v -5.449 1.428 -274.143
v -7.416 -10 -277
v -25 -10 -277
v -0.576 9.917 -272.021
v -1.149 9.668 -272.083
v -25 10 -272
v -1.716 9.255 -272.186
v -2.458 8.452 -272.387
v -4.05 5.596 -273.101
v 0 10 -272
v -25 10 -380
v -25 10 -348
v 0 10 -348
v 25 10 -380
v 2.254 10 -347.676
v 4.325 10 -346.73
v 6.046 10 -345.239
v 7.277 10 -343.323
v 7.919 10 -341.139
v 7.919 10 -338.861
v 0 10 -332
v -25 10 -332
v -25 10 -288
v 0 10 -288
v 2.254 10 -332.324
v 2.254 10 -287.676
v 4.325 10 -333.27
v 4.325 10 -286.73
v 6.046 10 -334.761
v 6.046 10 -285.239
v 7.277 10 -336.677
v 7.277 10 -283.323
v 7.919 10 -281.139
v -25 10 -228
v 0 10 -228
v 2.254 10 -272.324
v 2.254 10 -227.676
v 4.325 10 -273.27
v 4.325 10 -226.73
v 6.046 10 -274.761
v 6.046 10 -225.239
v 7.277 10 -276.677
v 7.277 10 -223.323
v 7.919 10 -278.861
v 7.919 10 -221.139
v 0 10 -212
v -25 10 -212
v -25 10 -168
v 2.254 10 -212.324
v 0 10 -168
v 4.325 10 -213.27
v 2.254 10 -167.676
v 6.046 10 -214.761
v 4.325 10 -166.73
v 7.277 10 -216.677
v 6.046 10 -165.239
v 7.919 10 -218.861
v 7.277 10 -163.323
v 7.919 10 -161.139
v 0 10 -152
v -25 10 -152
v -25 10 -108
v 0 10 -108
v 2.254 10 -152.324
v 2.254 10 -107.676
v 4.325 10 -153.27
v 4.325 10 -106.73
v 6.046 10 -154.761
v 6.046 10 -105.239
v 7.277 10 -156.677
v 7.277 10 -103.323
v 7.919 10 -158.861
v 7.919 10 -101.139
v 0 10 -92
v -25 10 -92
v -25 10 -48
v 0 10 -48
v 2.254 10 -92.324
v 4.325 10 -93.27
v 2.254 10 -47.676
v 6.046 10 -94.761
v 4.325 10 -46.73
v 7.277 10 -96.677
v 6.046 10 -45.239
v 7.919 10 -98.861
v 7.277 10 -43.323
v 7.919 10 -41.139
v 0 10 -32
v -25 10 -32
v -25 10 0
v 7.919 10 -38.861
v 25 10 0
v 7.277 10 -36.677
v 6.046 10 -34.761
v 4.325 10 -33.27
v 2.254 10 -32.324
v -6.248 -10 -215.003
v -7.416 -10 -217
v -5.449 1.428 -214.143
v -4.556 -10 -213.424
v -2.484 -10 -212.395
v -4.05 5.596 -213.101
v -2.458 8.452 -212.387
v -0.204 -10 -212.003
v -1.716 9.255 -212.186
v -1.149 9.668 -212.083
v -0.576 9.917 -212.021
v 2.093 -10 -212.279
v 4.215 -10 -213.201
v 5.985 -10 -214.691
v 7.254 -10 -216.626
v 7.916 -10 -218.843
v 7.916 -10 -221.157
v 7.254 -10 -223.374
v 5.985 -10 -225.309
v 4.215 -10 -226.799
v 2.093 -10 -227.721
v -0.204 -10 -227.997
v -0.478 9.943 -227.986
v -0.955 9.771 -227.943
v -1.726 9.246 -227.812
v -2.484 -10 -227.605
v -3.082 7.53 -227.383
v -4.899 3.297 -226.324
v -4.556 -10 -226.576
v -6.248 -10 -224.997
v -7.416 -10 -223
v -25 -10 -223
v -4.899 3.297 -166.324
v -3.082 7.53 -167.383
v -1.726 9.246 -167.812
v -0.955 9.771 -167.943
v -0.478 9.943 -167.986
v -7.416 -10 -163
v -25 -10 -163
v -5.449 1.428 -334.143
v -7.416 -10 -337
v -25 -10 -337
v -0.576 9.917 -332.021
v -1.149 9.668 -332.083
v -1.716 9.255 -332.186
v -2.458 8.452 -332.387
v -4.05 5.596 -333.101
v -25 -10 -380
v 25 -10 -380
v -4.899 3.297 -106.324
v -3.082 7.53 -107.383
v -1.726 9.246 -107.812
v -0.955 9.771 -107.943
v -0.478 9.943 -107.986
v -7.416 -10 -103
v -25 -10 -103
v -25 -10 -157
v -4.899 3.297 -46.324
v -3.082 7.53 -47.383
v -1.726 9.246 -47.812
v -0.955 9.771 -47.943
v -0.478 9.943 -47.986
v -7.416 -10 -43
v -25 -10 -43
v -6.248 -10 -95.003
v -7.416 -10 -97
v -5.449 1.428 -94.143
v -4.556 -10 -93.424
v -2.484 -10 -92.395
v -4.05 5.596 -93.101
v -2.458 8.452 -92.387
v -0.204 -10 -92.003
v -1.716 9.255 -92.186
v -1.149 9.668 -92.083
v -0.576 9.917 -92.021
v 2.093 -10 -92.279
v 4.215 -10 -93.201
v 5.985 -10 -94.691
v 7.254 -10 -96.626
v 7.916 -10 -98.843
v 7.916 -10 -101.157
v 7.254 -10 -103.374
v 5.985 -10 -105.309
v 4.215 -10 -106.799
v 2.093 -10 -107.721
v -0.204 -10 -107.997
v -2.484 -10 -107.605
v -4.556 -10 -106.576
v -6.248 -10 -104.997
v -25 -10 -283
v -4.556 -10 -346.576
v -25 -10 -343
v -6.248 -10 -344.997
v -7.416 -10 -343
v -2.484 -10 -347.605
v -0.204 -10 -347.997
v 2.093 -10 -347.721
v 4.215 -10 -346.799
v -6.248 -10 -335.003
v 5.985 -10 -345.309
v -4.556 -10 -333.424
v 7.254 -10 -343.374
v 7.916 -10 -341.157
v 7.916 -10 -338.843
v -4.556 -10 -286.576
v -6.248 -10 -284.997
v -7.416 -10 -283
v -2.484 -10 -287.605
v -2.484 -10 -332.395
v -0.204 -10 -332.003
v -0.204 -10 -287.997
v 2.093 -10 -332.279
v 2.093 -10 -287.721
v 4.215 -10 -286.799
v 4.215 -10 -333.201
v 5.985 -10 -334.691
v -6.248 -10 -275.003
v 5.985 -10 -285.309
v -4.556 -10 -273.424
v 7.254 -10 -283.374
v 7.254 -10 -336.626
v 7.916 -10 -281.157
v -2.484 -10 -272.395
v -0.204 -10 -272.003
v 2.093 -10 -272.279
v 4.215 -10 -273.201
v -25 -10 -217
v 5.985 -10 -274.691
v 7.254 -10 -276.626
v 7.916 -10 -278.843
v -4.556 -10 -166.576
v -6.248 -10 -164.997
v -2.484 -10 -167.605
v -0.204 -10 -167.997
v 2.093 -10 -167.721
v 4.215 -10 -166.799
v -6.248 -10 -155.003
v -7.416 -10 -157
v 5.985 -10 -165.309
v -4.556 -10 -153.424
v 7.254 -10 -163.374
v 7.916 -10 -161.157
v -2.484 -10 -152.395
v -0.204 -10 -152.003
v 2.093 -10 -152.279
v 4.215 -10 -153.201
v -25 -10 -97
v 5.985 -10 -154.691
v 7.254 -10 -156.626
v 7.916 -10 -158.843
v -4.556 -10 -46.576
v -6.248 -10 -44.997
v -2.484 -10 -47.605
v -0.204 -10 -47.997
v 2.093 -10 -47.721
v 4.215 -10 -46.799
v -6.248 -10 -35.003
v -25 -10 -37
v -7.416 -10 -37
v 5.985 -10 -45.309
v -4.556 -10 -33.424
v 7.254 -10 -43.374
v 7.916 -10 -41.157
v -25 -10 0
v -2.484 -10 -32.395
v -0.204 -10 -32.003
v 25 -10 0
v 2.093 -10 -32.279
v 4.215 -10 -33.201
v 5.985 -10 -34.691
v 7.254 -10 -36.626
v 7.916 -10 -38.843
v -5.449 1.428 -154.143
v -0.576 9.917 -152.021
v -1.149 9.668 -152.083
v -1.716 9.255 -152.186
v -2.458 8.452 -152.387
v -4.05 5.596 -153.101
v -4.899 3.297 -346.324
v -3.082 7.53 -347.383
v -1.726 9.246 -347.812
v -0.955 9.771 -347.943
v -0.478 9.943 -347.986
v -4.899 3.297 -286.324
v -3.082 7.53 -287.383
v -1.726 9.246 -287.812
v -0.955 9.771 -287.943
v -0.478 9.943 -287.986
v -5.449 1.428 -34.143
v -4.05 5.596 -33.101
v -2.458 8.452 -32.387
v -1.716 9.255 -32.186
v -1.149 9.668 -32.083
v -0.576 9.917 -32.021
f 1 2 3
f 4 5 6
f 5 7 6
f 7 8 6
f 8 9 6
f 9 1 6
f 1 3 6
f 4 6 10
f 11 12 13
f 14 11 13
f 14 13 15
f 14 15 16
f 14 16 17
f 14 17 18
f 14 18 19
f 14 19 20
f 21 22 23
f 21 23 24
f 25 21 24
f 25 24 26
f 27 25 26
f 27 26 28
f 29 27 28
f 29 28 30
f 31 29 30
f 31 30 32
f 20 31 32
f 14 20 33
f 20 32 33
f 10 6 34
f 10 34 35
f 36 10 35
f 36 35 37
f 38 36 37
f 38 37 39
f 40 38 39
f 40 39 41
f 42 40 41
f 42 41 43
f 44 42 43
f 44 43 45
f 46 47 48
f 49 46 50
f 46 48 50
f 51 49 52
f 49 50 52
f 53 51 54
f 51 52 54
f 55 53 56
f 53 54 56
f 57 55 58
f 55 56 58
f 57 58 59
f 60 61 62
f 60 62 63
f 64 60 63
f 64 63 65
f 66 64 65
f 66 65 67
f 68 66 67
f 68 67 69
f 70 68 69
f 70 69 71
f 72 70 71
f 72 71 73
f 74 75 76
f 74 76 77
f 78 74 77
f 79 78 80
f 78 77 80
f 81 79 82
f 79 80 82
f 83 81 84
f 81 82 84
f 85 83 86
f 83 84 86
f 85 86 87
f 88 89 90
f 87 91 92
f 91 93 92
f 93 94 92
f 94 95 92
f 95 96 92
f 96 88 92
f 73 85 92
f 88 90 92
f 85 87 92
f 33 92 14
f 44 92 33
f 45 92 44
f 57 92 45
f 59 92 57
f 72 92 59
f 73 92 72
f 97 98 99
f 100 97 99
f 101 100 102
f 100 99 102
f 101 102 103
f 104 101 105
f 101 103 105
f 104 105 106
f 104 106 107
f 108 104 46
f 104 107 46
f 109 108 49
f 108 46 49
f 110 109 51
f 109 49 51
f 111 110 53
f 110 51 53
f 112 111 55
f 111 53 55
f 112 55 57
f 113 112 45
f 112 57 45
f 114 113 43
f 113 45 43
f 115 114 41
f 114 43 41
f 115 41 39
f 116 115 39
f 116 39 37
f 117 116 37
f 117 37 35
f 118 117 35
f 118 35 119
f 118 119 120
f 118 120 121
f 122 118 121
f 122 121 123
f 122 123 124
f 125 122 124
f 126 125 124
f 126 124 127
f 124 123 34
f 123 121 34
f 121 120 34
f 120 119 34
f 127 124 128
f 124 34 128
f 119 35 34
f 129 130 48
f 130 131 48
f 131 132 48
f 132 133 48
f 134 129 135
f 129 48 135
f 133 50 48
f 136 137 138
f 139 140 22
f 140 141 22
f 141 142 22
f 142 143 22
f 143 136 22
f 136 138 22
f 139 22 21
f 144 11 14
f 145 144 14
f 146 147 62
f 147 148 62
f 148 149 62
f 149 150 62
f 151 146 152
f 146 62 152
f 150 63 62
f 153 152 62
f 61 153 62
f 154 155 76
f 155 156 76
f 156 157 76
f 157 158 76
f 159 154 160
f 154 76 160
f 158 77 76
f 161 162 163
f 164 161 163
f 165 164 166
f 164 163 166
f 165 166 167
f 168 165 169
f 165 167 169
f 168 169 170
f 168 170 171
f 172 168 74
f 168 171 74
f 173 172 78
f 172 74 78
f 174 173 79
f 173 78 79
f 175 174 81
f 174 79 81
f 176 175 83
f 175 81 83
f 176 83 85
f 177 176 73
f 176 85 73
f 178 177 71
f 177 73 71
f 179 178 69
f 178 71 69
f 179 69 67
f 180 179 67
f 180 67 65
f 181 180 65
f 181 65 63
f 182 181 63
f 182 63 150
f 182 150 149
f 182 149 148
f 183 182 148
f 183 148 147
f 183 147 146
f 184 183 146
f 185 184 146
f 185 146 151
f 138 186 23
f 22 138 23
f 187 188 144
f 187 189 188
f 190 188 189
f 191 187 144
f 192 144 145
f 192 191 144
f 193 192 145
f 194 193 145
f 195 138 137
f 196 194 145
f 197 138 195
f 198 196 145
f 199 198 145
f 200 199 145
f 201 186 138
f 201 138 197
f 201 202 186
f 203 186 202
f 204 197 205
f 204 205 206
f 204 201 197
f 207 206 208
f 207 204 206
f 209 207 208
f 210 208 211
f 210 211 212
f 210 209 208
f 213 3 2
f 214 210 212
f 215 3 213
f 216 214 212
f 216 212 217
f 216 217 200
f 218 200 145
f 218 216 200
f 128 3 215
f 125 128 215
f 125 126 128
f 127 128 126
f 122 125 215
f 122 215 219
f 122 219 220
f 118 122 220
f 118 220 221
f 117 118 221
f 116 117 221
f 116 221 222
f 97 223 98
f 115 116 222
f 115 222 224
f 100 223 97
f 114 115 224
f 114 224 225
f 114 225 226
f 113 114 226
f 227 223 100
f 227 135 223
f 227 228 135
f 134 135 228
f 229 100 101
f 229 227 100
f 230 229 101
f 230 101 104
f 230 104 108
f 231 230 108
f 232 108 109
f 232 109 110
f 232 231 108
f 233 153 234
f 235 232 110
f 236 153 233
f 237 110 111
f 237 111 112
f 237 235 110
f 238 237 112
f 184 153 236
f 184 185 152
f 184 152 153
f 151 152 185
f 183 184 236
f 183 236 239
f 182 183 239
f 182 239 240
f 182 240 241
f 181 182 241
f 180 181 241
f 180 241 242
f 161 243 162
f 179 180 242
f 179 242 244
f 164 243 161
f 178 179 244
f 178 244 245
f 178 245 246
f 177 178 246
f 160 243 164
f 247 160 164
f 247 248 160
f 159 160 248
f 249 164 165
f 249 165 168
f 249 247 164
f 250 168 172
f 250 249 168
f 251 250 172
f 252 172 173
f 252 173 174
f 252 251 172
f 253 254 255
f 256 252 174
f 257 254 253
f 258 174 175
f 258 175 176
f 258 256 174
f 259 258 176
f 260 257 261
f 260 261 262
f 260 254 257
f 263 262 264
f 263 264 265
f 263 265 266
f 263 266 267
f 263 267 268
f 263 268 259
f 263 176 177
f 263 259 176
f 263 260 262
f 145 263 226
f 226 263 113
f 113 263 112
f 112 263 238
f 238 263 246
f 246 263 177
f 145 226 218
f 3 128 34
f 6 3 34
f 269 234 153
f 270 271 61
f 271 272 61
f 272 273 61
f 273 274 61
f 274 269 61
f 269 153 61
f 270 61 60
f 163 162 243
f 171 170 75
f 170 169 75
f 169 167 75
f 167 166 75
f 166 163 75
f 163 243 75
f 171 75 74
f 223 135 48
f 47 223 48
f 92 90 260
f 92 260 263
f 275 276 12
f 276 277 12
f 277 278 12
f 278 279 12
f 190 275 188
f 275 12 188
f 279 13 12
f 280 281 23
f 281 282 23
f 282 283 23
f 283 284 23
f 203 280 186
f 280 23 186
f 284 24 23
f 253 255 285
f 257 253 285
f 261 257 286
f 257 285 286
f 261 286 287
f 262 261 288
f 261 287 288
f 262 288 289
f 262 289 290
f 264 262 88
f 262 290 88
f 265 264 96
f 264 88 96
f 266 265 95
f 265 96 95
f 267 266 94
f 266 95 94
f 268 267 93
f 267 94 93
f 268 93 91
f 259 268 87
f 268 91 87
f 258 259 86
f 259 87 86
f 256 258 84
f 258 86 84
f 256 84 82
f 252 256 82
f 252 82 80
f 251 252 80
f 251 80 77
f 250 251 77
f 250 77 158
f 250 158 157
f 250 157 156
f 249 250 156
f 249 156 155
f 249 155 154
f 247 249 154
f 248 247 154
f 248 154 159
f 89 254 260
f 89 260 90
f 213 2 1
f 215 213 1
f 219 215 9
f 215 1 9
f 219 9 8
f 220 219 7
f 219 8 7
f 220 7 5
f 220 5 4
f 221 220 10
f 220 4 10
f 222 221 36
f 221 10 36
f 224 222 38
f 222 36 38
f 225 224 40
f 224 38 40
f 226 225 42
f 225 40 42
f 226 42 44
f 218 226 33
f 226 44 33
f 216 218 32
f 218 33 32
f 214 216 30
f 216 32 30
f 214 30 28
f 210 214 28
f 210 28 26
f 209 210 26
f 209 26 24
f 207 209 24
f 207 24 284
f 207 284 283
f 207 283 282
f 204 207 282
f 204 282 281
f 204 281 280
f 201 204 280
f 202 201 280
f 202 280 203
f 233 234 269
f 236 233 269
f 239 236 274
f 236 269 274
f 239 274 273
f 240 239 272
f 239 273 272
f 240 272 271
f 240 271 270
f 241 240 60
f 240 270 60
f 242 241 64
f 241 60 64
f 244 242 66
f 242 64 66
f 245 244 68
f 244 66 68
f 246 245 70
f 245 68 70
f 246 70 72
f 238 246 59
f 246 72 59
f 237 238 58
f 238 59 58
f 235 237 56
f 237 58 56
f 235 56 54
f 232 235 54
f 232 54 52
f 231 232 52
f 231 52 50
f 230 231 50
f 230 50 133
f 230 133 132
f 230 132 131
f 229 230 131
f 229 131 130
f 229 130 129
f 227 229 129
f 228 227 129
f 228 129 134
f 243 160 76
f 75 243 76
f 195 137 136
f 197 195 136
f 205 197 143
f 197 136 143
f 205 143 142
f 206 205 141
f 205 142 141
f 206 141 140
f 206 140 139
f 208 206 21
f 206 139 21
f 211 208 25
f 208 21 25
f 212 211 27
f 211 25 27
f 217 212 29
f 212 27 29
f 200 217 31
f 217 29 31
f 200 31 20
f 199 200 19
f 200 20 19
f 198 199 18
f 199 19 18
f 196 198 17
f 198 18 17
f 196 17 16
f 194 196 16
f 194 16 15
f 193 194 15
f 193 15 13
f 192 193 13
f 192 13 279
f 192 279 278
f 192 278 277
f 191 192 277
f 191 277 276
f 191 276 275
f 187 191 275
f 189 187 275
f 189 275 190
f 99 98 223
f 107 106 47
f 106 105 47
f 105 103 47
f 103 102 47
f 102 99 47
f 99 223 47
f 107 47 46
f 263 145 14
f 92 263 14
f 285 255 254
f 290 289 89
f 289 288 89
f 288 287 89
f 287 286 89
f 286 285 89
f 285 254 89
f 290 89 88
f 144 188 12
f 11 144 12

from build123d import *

# Parameters (mm, degrees)
SKETCH1_W           = 50
SKETCH1_H           = 20
BOSS_EXTRUDE1_DEPTH = 380
SKETCH2_R           = 8
CUT_EXTRUDE1_DEPTH  = 21
CUT_EXTRUDE2_REACH  = 52


with BuildPart() as part:
    # Sketch1 → Boss-Extrude1 (new body)
    with BuildSketch(Plane.XY):
        Rectangle(SKETCH1_W, SKETCH1_H)
    extrude(amount=-BOSS_EXTRUDE1_DEPTH)

    # Sketch2 → Cut-Extrude1 (cut, through all)
    with BuildSketch(Plane(origin=(0, 10, 0), x_dir=(1, 0, 0), z_dir=(0, 1, 0))):
        with Locations((0, 40)):
            Circle(SKETCH2_R)
        with Locations((0, 100)):
            Circle(SKETCH2_R)
        with Locations((0, 160)):
            Circle(SKETCH2_R)
        with Locations((0, 220)):
            Circle(SKETCH2_R)
        with Locations((0, 280)):
            Circle(SKETCH2_R)
        with Locations((0, 340)):
            Circle(SKETCH2_R)
    extrude(amount=-CUT_EXTRUDE1_DEPTH, mode=Mode.SUBTRACT)

    # Sketch3 → Cut-Extrude2 (cut, up to next)
    with BuildSketch(Plane.ZY.offset(25), mode=Mode.PRIVATE) as cut_extrude2_sk1:
        Polygon((-348, 10), (-343, -10), (-337, -10), (-332, 10), align=None)
    cut_extrude2_tool1 = extrude(cut_extrude2_sk1.sketch, amount=-CUT_EXTRUDE2_REACH, mode=Mode.PRIVATE) & part.part
    add(cut_extrude2_tool1.solids().sort_by_distance((-25, 1.515152, -340))[0], mode=Mode.SUBTRACT)
    # Sketch3 → Cut-Extrude2 (cut, up to next)
    with BuildSketch(Plane.ZY.offset(25), mode=Mode.PRIVATE) as cut_extrude2_sk2:
        Polygon((-288, 10), (-283, -10), (-277, -10), (-272, 10), align=None)
    cut_extrude2_tool2 = extrude(cut_extrude2_sk2.sketch, amount=-CUT_EXTRUDE2_REACH, mode=Mode.PRIVATE) & part.part
    add(cut_extrude2_tool2.solids().sort_by_distance((-25, 1.515152, -280))[0], mode=Mode.SUBTRACT)
    # Sketch3 → Cut-Extrude2 (cut, up to next)
    with BuildSketch(Plane.ZY.offset(25), mode=Mode.PRIVATE) as cut_extrude2_sk3:
        Polygon((-228, 10), (-223, -10), (-217, -10), (-212, 10), align=None)
    cut_extrude2_tool3 = extrude(cut_extrude2_sk3.sketch, amount=-CUT_EXTRUDE2_REACH, mode=Mode.PRIVATE) & part.part
    add(cut_extrude2_tool3.solids().sort_by_distance((-25, 1.515152, -220))[0], mode=Mode.SUBTRACT)
    # Sketch3 → Cut-Extrude2 (cut, up to next)
    with BuildSketch(Plane.ZY.offset(25), mode=Mode.PRIVATE) as cut_extrude2_sk4:
        Polygon((-168, 10), (-163, -10), (-157, -10), (-152, 10), align=None)
    cut_extrude2_tool4 = extrude(cut_extrude2_sk4.sketch, amount=-CUT_EXTRUDE2_REACH, mode=Mode.PRIVATE) & part.part
    add(cut_extrude2_tool4.solids().sort_by_distance((-25, 1.515152, -160))[0], mode=Mode.SUBTRACT)
    # Sketch3 → Cut-Extrude2 (cut, up to next)
    with BuildSketch(Plane.ZY.offset(25), mode=Mode.PRIVATE) as cut_extrude2_sk5:
        Polygon((-108, 10), (-103, -10), (-97, -10), (-92, 10), align=None)
    cut_extrude2_tool5 = extrude(cut_extrude2_sk5.sketch, amount=-CUT_EXTRUDE2_REACH, mode=Mode.PRIVATE) & part.part
    add(cut_extrude2_tool5.solids().sort_by_distance((-25, 1.515152, -100))[0], mode=Mode.SUBTRACT)
    # Sketch3 → Cut-Extrude2 (cut, up to next)
    with BuildSketch(Plane.ZY.offset(25), mode=Mode.PRIVATE) as cut_extrude2_sk6:
        Polygon((-48, 10), (-43, -10), (-37, -10), (-32, 10), align=None)
    cut_extrude2_tool6 = extrude(cut_extrude2_sk6.sketch, amount=-CUT_EXTRUDE2_REACH, mode=Mode.PRIVATE) & part.part
    add(cut_extrude2_tool6.solids().sort_by_distance((-25, 1.515152, -40))[0], mode=Mode.SUBTRACT)


solid = part.part
